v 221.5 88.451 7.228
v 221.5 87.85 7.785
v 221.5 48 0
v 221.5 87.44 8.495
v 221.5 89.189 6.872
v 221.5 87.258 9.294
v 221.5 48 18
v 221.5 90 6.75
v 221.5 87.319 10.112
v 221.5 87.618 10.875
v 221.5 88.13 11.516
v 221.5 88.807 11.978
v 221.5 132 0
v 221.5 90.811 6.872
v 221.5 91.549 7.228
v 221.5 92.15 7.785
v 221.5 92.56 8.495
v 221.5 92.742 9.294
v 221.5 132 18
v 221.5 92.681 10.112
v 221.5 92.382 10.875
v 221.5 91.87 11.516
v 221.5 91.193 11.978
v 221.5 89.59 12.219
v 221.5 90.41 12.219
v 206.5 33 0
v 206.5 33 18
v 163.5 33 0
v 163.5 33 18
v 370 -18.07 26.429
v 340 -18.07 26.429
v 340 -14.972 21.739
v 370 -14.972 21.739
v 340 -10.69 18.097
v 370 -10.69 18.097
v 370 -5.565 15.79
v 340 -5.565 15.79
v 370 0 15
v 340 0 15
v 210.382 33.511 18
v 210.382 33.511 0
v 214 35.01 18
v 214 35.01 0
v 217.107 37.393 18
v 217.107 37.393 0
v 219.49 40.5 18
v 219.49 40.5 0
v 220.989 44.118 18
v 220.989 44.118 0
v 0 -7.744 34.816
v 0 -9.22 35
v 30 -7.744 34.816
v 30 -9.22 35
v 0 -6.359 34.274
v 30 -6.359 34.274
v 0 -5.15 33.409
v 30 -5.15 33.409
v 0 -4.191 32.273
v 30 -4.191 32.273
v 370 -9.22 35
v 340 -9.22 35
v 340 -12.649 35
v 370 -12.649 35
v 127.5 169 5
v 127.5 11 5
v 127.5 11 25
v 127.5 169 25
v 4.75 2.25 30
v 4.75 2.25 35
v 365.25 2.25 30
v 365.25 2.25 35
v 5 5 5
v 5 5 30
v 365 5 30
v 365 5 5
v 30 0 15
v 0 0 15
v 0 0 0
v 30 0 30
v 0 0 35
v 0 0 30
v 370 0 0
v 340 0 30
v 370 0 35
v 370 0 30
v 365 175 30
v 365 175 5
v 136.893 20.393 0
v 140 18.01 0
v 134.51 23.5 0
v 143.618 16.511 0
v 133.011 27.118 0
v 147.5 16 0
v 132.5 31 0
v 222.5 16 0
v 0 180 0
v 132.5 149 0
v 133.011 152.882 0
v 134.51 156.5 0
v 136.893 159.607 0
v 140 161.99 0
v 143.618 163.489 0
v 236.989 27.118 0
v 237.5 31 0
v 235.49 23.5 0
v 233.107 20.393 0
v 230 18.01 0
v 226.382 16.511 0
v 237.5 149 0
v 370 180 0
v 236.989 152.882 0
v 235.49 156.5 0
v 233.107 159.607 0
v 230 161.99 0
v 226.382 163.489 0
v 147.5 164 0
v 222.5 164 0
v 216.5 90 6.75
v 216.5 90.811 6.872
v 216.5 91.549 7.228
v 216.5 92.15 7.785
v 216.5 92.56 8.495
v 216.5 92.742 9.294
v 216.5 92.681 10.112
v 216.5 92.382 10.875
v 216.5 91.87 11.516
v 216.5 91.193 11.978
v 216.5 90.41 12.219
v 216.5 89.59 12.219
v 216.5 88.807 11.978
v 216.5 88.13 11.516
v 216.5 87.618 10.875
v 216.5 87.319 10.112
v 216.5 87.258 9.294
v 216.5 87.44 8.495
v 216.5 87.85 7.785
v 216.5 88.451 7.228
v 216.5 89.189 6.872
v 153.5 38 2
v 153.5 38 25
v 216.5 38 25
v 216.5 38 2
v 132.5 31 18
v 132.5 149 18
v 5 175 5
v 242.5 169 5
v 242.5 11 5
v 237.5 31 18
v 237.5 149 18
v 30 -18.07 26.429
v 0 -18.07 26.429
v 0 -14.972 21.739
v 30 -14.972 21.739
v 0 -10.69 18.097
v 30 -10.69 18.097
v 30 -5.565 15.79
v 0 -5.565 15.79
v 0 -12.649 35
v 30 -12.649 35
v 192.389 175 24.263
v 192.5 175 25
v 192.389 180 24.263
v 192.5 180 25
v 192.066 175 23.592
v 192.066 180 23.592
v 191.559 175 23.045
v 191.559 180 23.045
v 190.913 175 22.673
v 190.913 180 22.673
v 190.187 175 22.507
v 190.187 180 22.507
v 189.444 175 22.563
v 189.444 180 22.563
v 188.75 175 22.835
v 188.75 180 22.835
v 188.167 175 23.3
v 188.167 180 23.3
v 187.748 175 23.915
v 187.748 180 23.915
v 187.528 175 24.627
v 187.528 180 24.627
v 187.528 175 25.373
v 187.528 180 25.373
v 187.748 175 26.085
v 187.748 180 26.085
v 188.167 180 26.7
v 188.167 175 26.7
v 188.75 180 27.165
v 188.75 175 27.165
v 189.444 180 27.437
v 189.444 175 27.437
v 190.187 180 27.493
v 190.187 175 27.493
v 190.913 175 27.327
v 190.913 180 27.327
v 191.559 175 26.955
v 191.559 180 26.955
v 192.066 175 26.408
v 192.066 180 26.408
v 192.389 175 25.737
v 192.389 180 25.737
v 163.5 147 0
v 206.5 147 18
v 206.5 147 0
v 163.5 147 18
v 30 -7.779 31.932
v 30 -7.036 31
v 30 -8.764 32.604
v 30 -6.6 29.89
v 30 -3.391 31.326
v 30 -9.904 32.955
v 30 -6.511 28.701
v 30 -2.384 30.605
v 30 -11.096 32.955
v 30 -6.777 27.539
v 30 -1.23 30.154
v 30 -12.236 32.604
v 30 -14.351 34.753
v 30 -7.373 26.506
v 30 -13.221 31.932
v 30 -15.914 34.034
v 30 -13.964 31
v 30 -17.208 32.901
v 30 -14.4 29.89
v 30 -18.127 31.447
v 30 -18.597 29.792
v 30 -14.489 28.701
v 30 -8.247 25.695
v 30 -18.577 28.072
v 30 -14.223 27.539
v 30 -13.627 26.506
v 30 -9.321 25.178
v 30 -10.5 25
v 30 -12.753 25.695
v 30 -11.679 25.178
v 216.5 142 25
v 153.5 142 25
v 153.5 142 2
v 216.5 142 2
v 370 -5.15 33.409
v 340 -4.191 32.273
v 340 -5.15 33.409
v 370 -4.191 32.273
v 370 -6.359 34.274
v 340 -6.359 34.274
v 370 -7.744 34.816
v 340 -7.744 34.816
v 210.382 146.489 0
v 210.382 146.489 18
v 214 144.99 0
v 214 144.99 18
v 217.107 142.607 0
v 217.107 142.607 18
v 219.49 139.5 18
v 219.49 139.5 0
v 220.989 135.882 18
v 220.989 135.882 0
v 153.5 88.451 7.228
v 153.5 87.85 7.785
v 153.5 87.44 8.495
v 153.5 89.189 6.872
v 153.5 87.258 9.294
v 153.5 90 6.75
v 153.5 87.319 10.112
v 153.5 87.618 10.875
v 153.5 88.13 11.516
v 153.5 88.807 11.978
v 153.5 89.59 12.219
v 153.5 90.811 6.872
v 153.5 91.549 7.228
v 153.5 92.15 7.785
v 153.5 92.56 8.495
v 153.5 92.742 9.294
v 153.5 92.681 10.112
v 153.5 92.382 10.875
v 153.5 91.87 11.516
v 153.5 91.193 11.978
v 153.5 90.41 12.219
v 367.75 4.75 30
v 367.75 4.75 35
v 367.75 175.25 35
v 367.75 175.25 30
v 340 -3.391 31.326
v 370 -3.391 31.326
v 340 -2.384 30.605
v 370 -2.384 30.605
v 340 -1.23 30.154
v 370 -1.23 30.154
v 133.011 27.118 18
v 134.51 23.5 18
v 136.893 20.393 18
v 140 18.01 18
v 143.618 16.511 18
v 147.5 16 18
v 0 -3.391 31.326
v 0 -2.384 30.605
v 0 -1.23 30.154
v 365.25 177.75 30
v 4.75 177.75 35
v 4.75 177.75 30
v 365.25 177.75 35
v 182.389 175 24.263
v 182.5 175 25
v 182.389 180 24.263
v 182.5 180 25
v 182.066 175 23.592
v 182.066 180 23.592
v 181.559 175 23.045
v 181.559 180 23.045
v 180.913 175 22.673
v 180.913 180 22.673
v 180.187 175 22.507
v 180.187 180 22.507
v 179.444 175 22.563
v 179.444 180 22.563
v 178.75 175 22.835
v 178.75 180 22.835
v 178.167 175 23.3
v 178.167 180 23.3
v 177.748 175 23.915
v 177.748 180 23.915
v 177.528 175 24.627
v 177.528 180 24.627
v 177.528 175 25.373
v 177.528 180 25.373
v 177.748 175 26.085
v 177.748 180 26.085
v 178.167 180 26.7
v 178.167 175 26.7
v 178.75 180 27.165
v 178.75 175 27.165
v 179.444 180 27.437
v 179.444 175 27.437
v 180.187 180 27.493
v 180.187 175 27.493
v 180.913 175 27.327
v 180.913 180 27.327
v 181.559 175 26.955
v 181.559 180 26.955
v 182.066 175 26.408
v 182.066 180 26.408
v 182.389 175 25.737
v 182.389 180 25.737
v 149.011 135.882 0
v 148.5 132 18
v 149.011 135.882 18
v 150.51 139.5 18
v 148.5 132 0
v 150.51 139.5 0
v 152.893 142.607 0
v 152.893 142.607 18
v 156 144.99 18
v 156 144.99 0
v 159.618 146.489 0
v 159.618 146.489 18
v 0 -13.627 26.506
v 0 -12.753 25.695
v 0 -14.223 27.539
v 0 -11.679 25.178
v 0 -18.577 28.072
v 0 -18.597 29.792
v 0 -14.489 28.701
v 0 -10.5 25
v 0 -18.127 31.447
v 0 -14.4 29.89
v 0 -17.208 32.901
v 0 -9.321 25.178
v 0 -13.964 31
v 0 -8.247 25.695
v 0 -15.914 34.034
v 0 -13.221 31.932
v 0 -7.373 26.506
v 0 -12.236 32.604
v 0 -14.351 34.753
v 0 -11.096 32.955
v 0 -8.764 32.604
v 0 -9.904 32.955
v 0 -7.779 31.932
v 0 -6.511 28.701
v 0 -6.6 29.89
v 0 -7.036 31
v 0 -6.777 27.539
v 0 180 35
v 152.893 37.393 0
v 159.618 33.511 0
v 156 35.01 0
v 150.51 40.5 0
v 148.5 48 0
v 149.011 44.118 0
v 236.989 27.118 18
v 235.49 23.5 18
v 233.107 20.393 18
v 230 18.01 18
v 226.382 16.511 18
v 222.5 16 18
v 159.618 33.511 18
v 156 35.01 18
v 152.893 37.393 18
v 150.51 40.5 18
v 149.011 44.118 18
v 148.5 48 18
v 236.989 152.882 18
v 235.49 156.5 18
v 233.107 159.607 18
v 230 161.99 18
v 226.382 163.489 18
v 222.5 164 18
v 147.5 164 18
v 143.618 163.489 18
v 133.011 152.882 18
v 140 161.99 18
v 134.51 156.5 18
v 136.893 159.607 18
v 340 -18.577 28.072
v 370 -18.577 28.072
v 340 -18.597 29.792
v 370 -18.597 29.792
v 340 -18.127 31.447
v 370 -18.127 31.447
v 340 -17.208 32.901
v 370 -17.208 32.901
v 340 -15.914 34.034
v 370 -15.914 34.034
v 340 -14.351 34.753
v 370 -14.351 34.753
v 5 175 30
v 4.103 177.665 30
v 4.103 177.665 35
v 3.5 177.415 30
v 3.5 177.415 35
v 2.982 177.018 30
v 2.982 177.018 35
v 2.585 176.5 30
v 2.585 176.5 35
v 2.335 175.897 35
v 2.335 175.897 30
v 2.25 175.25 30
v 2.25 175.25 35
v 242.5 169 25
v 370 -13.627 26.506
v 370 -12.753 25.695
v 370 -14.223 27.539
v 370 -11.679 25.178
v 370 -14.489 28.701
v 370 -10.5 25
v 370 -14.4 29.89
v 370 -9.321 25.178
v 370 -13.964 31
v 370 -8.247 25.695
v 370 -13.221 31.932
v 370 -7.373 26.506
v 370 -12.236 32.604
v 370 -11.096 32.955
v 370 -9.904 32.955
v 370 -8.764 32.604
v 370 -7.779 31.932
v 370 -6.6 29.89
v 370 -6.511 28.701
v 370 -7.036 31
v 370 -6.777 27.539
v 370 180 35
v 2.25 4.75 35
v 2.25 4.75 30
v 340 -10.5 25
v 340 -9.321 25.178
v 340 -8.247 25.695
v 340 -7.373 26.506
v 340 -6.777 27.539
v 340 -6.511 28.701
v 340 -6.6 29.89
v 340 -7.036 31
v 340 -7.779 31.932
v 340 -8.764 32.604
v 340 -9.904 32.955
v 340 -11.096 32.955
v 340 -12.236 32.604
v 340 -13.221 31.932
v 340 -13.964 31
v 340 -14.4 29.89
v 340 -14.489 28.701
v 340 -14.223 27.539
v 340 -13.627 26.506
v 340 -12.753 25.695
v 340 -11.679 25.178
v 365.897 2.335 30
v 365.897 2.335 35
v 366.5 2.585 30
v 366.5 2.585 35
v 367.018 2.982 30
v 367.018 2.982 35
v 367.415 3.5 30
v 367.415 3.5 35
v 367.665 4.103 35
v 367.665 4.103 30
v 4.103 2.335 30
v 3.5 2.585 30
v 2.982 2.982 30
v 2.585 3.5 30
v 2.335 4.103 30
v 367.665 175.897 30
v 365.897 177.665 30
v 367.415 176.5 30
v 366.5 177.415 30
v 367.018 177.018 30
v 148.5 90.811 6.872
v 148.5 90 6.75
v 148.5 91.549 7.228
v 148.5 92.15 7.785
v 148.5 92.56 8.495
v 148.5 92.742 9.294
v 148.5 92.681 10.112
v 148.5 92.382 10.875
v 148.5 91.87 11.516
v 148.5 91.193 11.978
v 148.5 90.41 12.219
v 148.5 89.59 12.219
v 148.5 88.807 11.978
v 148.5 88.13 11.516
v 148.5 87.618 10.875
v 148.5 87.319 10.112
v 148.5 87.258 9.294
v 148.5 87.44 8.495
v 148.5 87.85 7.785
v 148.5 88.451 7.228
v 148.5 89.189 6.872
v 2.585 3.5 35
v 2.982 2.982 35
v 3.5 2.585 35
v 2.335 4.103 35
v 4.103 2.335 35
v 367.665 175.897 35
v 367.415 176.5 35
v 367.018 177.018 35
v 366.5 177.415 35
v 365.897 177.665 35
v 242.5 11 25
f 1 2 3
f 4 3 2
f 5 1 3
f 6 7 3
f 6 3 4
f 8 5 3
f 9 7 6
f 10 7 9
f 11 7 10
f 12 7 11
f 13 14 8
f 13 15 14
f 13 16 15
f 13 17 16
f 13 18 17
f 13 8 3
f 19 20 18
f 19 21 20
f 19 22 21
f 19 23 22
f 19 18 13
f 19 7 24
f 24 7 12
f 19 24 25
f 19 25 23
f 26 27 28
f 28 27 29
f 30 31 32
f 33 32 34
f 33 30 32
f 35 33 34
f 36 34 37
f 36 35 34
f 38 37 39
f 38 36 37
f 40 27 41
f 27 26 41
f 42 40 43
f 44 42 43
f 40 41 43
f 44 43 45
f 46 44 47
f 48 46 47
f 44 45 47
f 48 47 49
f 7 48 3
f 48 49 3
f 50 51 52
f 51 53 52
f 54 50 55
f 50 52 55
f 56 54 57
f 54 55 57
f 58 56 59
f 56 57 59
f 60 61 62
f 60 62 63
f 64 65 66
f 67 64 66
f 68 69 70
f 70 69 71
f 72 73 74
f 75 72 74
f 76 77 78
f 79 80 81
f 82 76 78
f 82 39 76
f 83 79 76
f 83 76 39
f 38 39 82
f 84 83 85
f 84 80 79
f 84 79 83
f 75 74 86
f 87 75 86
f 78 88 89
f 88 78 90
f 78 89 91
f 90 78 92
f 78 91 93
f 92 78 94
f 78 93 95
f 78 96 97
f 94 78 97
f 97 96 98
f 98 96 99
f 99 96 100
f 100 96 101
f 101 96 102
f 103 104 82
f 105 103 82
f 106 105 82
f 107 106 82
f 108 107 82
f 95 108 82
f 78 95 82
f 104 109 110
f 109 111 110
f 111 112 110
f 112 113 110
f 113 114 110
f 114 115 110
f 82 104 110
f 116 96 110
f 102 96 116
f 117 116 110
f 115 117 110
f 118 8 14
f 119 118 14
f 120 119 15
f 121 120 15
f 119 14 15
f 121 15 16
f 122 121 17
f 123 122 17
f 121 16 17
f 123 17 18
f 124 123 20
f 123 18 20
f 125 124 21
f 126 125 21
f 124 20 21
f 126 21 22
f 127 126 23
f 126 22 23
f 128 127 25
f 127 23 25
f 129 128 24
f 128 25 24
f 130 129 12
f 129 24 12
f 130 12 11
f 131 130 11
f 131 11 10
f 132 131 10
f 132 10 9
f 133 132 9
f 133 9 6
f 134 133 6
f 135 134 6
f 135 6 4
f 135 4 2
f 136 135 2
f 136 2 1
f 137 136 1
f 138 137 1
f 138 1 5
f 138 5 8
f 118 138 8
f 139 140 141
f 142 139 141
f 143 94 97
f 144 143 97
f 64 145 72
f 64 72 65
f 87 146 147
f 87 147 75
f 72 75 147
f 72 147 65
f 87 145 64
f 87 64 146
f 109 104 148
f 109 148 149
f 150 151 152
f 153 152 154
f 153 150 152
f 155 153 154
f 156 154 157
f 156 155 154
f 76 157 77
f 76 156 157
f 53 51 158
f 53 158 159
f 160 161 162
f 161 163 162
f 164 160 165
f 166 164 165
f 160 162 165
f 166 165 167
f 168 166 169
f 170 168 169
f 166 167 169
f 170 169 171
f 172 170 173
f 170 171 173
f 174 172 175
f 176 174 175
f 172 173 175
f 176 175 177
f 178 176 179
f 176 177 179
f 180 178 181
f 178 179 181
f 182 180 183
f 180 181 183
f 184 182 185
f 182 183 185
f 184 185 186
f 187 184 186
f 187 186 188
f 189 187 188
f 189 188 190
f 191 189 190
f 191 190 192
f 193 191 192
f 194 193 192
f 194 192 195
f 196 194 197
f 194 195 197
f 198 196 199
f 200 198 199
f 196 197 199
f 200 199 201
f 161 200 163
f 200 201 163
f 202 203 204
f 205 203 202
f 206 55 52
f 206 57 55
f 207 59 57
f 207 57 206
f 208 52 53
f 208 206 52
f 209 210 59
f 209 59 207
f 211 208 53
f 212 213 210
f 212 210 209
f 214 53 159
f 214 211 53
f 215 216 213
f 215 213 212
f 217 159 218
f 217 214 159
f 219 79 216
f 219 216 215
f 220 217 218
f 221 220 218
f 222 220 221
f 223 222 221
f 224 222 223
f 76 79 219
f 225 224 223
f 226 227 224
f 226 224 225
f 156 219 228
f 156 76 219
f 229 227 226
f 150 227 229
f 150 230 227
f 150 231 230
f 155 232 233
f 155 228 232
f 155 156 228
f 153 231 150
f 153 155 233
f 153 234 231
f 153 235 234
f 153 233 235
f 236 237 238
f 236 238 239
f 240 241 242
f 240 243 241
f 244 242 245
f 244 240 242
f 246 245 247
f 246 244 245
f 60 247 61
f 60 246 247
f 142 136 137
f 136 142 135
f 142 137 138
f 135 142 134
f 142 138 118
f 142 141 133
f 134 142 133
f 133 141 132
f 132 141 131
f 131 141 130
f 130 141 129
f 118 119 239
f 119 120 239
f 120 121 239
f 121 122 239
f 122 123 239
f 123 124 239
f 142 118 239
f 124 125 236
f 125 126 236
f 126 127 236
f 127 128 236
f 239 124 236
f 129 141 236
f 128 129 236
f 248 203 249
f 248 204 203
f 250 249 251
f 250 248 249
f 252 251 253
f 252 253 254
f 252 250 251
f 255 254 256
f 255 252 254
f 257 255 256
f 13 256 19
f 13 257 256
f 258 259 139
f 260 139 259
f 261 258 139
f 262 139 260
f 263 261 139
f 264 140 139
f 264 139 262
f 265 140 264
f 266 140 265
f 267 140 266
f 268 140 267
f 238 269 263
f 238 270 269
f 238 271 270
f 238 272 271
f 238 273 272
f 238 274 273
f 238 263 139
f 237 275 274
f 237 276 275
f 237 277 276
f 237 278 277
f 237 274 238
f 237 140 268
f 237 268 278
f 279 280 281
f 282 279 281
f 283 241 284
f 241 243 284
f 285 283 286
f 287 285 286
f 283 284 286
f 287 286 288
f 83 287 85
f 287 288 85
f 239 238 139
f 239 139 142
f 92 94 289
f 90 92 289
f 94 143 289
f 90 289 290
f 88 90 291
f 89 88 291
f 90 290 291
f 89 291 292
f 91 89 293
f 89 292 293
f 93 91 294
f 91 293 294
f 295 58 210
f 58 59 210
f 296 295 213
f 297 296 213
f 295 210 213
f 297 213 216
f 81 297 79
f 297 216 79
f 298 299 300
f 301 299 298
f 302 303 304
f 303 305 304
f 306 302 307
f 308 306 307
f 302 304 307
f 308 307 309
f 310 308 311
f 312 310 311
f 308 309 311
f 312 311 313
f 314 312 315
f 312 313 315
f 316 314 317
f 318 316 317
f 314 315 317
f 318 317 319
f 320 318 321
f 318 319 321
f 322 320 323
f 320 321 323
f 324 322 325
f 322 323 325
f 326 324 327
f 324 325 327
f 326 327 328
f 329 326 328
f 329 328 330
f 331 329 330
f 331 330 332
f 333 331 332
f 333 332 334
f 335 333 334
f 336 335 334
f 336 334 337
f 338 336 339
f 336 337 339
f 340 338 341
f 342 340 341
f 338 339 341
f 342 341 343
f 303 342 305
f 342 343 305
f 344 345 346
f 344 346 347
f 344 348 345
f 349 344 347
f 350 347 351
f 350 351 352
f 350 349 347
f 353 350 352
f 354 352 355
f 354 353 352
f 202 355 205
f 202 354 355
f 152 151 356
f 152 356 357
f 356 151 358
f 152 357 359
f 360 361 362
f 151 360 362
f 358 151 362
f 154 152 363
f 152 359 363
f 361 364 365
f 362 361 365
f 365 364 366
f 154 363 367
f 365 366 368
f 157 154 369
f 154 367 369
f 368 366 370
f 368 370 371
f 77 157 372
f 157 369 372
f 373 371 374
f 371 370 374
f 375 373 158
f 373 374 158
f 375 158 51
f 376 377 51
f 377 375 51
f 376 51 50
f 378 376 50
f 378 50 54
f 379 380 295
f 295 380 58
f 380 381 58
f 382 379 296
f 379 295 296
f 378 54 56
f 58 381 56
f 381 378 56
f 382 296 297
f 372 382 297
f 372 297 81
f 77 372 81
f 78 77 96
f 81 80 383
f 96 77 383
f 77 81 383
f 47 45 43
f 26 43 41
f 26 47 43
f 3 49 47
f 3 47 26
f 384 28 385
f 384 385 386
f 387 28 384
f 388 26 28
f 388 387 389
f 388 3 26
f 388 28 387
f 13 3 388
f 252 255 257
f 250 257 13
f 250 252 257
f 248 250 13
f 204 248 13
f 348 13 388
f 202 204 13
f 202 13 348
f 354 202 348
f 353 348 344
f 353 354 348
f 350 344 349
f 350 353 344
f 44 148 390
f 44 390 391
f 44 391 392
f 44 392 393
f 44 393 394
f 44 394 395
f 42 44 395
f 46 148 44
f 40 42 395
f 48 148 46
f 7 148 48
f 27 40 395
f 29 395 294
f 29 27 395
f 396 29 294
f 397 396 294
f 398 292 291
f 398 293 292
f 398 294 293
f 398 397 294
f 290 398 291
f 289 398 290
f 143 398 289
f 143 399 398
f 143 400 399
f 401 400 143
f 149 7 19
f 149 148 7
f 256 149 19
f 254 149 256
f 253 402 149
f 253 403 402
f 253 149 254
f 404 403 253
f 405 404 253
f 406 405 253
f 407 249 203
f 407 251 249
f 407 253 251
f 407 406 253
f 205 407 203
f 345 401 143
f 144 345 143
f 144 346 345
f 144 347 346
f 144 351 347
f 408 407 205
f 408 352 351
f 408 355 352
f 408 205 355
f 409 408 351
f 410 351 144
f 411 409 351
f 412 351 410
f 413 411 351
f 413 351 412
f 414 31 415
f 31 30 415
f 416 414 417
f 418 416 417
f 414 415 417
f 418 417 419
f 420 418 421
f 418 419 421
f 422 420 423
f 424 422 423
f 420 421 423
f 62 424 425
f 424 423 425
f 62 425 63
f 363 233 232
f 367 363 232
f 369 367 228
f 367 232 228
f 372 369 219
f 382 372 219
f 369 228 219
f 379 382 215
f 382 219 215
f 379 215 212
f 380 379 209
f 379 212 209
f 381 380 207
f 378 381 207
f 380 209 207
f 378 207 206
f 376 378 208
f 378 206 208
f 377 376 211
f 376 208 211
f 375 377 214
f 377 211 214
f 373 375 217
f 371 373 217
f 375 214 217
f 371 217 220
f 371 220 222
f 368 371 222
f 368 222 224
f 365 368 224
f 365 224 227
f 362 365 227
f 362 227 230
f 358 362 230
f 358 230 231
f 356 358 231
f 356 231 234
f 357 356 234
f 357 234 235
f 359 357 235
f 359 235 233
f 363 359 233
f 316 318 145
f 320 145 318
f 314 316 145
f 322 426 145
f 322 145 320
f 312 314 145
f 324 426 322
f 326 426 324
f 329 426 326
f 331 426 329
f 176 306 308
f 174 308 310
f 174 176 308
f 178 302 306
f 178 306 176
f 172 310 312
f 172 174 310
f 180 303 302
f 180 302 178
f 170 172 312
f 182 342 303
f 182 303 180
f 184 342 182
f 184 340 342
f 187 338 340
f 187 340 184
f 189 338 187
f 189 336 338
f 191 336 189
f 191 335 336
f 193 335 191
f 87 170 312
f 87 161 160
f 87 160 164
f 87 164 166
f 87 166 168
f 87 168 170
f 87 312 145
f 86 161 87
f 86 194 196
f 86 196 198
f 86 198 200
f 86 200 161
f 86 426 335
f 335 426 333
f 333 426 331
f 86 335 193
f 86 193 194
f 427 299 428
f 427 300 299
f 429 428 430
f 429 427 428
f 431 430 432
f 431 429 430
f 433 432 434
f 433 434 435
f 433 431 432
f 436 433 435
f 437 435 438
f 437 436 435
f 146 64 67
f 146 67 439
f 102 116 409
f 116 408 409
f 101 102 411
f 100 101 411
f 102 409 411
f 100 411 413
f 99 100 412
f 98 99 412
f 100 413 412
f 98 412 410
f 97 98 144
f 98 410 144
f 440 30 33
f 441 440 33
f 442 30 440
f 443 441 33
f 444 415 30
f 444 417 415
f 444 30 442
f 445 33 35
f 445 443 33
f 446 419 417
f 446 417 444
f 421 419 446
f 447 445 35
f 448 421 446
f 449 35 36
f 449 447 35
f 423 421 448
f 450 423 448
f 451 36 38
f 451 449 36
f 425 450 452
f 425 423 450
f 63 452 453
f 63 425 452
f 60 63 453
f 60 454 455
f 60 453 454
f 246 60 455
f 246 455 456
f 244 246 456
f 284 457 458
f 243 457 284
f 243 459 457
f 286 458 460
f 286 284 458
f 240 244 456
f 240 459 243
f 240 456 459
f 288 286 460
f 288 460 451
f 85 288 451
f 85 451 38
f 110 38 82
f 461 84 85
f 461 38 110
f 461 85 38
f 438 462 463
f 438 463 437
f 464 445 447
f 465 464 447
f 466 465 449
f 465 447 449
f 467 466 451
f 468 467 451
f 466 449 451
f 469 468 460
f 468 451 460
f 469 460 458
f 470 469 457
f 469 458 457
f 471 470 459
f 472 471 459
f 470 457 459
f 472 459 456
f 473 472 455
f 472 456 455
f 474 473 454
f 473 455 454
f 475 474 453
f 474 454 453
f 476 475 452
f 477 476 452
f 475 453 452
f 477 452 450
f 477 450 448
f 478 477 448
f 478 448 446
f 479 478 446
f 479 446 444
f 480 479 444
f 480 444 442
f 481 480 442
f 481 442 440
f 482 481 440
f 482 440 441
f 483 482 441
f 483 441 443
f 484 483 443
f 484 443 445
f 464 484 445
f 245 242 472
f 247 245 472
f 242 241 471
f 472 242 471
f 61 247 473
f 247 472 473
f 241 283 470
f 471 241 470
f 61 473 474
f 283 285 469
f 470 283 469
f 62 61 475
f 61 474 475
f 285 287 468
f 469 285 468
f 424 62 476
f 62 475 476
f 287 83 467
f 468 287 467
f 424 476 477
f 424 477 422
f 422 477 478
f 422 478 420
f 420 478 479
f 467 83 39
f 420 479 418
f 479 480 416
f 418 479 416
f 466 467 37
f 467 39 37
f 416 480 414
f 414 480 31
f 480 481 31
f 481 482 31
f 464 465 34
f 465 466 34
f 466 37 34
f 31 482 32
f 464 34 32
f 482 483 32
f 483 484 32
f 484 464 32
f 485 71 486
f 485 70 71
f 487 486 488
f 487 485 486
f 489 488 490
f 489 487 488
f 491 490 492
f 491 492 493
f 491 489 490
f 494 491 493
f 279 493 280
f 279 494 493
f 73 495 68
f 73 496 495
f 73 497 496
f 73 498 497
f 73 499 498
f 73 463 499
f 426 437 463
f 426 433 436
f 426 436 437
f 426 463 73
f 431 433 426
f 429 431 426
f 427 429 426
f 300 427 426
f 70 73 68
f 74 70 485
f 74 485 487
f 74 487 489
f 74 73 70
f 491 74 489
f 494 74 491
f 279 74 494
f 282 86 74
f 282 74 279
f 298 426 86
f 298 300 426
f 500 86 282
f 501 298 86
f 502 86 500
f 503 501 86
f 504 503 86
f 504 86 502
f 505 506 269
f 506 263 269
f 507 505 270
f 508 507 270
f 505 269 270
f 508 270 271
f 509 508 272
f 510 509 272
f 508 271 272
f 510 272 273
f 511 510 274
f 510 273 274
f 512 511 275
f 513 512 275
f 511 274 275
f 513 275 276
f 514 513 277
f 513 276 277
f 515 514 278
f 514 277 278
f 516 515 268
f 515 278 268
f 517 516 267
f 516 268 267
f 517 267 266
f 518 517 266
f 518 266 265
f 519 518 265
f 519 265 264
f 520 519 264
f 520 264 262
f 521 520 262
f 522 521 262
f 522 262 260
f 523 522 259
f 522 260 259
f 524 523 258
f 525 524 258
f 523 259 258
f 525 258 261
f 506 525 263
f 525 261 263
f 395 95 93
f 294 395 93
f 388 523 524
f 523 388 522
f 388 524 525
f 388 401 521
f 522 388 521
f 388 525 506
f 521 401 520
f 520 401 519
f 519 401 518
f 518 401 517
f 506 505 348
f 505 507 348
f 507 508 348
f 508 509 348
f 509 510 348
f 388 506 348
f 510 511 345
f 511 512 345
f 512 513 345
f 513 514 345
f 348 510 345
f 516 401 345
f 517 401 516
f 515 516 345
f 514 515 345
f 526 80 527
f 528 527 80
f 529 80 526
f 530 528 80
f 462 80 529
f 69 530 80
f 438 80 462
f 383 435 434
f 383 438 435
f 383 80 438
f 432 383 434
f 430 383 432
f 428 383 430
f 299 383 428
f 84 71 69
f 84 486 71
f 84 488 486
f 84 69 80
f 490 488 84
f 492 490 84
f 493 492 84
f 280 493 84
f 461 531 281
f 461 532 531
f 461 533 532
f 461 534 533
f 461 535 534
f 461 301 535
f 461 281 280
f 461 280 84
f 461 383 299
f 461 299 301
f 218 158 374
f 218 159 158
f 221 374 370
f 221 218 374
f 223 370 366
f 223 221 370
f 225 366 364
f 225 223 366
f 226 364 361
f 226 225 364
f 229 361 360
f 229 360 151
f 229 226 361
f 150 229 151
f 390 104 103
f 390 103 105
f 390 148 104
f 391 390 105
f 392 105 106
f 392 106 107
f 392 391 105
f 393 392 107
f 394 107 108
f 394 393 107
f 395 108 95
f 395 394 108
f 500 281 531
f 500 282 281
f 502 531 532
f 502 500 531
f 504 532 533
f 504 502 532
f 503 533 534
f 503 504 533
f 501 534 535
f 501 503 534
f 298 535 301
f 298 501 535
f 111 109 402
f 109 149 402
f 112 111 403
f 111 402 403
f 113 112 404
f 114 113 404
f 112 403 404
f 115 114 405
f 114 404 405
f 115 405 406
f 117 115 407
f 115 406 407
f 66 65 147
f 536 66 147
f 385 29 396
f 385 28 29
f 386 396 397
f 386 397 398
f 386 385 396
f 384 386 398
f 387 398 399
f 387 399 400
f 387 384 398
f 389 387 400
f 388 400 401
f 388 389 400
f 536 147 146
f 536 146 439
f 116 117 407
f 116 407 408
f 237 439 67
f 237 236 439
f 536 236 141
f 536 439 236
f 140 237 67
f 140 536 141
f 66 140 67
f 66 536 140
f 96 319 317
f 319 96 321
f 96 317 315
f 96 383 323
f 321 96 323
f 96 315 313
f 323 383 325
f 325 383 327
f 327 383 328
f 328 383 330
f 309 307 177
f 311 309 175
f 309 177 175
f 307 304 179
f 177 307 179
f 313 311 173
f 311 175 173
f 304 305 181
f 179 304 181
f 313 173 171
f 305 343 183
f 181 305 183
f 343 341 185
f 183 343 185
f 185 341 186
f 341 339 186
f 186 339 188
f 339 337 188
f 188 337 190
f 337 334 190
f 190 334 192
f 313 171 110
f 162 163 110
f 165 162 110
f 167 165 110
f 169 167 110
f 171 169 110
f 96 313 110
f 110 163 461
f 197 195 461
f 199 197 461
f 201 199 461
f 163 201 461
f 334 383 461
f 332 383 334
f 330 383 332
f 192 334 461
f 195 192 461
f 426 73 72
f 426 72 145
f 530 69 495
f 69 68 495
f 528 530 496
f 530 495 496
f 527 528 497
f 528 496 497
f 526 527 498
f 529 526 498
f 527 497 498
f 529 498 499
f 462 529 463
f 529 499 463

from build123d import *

# Parameters (mm, degrees)
SKETCH1_W                      = 370
SKETCH1_H                      = 180
BOSS_EXTRUDE1_DEPTH            = 35
SKETCH2_W                      = 365.5
SKETCH2_H                      = 175.5
CUT_EXTRUDE1_DEPTH             = 5
SKETCH3_W                      = 360
SKETCH3_H                      = 170
CUT_EXTRUDE2_DEPTH             = 25
SKETCH4_W                      = 115
SKETCH4_H                      = 20
BOSS_EXTRUDE2_DEPTH            = 170
SKETCH5_W                      = 105
SKETCH5_H                      = 148
CUT_EXTRUDE3_DEPTH             = 18
SKETCH6_W                      = 73
SKETCH6_H                      = 114
BOSS_EXTRUDE3_DEPTH            = 18
F_15_0_15_DIAMETER_HOLE1_D     = 5.5
F_15_0_15_DIAMETER_HOLE1_DEPTH = 11
FILLET1_R                      = 2.5
FILLET2_R                      = 15
SKETCH11_W                     = 30
SKETCH11_H                     = 15
REVOLVE1_ANGLE                 = 90
SKETCH12_R                     = 4
CUT_EXTRUDE4_DEPTH             = 371
FILLET4_R                      = 6
FILLET5_R                      = 6
SKETCH13_W                     = 63
SKETCH13_H                     = 104
CUT_EXTRUDE5_DEPTH             = 23
CUT_EXTRUDE6_START             = -20
SKETCH14_W                     = 115
SKETCH14_H                     = 6
CUT_EXTRUDE6_DEPTH             = 20
CUT_EXTRUDE7_START             = -20
SKETCH15_W                     = 115
SKETCH15_H                     = 6
CUT_EXTRUDE7_DEPTH             = 20
CUT_EXTRUDE8_REACH             = 200.649
SKETCH17_R                     = 2.5
SKETCH18_R                     = 2.75
CUT_EXTRUDE9_DEPTH             = 10


with BuildPart() as part:
    # Sketch1 → Boss-Extrude1 (new body)
    with BuildSketch(Plane.XY.offset(35)):
        with Locations((185, 90)):
            Rectangle(SKETCH1_W, SKETCH1_H)
    extrude(amount=-BOSS_EXTRUDE1_DEPTH)

    # Sketch2 → Cut-Extrude1 (cut)
    with BuildSketch(Plane.XY.offset(35)):
        with Locations((185, 90)):
            Rectangle(SKETCH2_W, SKETCH2_H)
    extrude(amount=-CUT_EXTRUDE1_DEPTH, mode=Mode.SUBTRACT)

    # Sketch3 → Cut-Extrude2 (cut)
    with BuildSketch(Plane.XY.offset(30)):
        with Locations((185, 90)):
            Rectangle(SKETCH3_W, SKETCH3_H)
    extrude(amount=-CUT_EXTRUDE2_DEPTH, mode=Mode.SUBTRACT)

    # Sketch4 → Boss-Extrude2 (add)
    with BuildSketch(Plane(origin=(0, 5, 0), x_dir=(-1, 0, 0), z_dir=(0, 1, 0))):
        with Locations((-185, 15)):
            Rectangle(SKETCH4_W, SKETCH4_H)
    extrude(amount=BOSS_EXTRUDE2_DEPTH)

    # Sketch5 → Cut-Extrude3 (cut)
    with BuildSketch(Plane(origin=(0, 0, 0), x_dir=(-1, 0, 0), z_dir=(0, 0, -1))):
        with Locations((-185, 90)):
            Rectangle(SKETCH5_W, SKETCH5_H)
    extrude(amount=-CUT_EXTRUDE3_DEPTH, mode=Mode.SUBTRACT)

    # Sketch6 → Boss-Extrude3 (add)
    with BuildSketch(Plane(origin=(0, 0, 18), x_dir=(-1, 0, 0), z_dir=(0, 0, -1))):
        with Locations((-185, 90)):
            Rectangle(SKETCH6_W, SKETCH6_H)
    extrude(amount=BOSS_EXTRUDE3_DEPTH)

    # Ø15.0 (15) Diameter Hole1
    with Locations(Plane.ZY.offset(-148.5)):
        with Locations((9.5, 90)):
            Hole(F_15_0_15_DIAMETER_HOLE1_D / 2, depth=F_15_0_15_DIAMETER_HOLE1_DEPTH)

    # Fillet1
    fillet1_edges = [part.edges().sort_by_distance(p)[0] for p in [
        (2.25, 177.75, 32.5),
        (367.75, 177.75, 32.5),
        (367.75, 2.25, 32.5),
        (2.25, 2.25, 32.5),
    ]]
    fillet(fillet1_edges, radius=FILLET1_R)

    # Fillet2
    fillet2_edges = [part.edges().sort_by_distance(p)[0] for p in [
        (132.5, 16, 9),
        (237.5, 16, 9),
        (237.5, 164, 9),
        (132.5, 164, 9),
        (148.5, 147, 9),
        (221.5, 147, 9),
        (221.5, 33, 9),
        (148.5, 33, 9),
    ]]
    fillet(fillet2_edges, radius=FILLET2_R)

    # Sketch11 → Revolve1 (revolve)
    with BuildSketch(Plane.XY.offset(35)):
        with Locations((355, -12.5)):
            Rectangle(SKETCH11_W, SKETCH11_H)
        with Locations((15, -12.5)):
            Rectangle(SKETCH11_W, SKETCH11_H)
    revolve(axis=Axis((0, 0, 35), (1, 0, 0)), revolution_arc=REVOLVE1_ANGLE)

    # Sketch12 → Cut-Extrude4 (cut, through all)
    with BuildSketch(Plane(origin=(370, 0, 0), x_dir=(0, 0, -1), z_dir=(1, 0, 0))):
        with Locations((-29, -10.5)):
            Circle(SKETCH12_R)
    extrude(amount=-CUT_EXTRUDE4_DEPTH, mode=Mode.SUBTRACT)

    # Fillet4
    fillet4_edges = [part.edges().sort_by_distance(p)[0] for p in [
        (355, -20, 35),
        (15, -20, 35),
    ]]
    fillet(fillet4_edges, radius=FILLET4_R)

    # Fillet5
    fillet5_edges = [part.edges().sort_by_distance(p)[0] for p in [
        (355, -5, 35),
        (15, -5, 35),
    ]]
    fillet(fillet5_edges, radius=FILLET5_R)

    # Sketch13 → Cut-Extrude5 (cut)
    with BuildSketch(Plane.XY.offset(25)):
        with Locations((185, 90)):
            Rectangle(SKETCH13_W, SKETCH13_H)
    extrude(amount=-CUT_EXTRUDE5_DEPTH, mode=Mode.SUBTRACT)

    # Sketch14 → Cut-Extrude6 (cut)
    with BuildSketch(Plane.XY.offset(25).offset(CUT_EXTRUDE6_START)):
        with Locations((185, 172)):
            Rectangle(SKETCH14_W, SKETCH14_H)
    extrude(amount=CUT_EXTRUDE6_DEPTH, mode=Mode.SUBTRACT)

    # Sketch15 → Cut-Extrude7 (cut)
    with BuildSketch(Plane.XY.offset(25).offset(CUT_EXTRUDE7_START)):
        with Locations((185, 8)):
            Rectangle(SKETCH15_W, SKETCH15_H)
    extrude(amount=CUT_EXTRUDE7_DEPTH, mode=Mode.SUBTRACT)

    # Sketch17 → Cut-Extrude8 (cut, up to next)
    with BuildSketch(Plane(origin=(0, 180, 0), x_dir=(1, 0, 0), z_dir=(0, 1, 0)), mode=Mode.PRIVATE) as cut_extrude8_sk1:
        with Locations((180, -25)):
            Circle(SKETCH17_R)
    cut_extrude8_tool1 = extrude(cut_extrude8_sk1.sketch, amount=-CUT_EXTRUDE8_REACH, mode=Mode.PRIVATE) & part.part
    add(cut_extrude8_tool1.solids().sort_by_distance((180, 180, 25))[0], mode=Mode.SUBTRACT)
    # Sketch17 → Cut-Extrude8 (cut, up to next)
    with BuildSketch(Plane(origin=(0, 180, 0), x_dir=(1, 0, 0), z_dir=(0, 1, 0)), mode=Mode.PRIVATE) as cut_extrude8_sk2:
        with Locations((190, -25)):
            Circle(SKETCH17_R)
    cut_extrude8_tool2 = extrude(cut_extrude8_sk2.sketch, amount=-CUT_EXTRUDE8_REACH, mode=Mode.PRIVATE) & part.part
    add(cut_extrude8_tool2.solids().sort_by_distance((190, 180, 25))[0], mode=Mode.SUBTRACT)

    # Sketch18 → Cut-Extrude9 (cut)
    with BuildSketch(Plane(origin=(221.5, 0, 0), x_dir=(0, 0, -1), z_dir=(1, 0, 0))):
        with Locations((-9.5, 90)):
            Circle(SKETCH18_R)
    extrude(amount=-CUT_EXTRUDE9_DEPTH, mode=Mode.SUBTRACT)


solid = part.part
